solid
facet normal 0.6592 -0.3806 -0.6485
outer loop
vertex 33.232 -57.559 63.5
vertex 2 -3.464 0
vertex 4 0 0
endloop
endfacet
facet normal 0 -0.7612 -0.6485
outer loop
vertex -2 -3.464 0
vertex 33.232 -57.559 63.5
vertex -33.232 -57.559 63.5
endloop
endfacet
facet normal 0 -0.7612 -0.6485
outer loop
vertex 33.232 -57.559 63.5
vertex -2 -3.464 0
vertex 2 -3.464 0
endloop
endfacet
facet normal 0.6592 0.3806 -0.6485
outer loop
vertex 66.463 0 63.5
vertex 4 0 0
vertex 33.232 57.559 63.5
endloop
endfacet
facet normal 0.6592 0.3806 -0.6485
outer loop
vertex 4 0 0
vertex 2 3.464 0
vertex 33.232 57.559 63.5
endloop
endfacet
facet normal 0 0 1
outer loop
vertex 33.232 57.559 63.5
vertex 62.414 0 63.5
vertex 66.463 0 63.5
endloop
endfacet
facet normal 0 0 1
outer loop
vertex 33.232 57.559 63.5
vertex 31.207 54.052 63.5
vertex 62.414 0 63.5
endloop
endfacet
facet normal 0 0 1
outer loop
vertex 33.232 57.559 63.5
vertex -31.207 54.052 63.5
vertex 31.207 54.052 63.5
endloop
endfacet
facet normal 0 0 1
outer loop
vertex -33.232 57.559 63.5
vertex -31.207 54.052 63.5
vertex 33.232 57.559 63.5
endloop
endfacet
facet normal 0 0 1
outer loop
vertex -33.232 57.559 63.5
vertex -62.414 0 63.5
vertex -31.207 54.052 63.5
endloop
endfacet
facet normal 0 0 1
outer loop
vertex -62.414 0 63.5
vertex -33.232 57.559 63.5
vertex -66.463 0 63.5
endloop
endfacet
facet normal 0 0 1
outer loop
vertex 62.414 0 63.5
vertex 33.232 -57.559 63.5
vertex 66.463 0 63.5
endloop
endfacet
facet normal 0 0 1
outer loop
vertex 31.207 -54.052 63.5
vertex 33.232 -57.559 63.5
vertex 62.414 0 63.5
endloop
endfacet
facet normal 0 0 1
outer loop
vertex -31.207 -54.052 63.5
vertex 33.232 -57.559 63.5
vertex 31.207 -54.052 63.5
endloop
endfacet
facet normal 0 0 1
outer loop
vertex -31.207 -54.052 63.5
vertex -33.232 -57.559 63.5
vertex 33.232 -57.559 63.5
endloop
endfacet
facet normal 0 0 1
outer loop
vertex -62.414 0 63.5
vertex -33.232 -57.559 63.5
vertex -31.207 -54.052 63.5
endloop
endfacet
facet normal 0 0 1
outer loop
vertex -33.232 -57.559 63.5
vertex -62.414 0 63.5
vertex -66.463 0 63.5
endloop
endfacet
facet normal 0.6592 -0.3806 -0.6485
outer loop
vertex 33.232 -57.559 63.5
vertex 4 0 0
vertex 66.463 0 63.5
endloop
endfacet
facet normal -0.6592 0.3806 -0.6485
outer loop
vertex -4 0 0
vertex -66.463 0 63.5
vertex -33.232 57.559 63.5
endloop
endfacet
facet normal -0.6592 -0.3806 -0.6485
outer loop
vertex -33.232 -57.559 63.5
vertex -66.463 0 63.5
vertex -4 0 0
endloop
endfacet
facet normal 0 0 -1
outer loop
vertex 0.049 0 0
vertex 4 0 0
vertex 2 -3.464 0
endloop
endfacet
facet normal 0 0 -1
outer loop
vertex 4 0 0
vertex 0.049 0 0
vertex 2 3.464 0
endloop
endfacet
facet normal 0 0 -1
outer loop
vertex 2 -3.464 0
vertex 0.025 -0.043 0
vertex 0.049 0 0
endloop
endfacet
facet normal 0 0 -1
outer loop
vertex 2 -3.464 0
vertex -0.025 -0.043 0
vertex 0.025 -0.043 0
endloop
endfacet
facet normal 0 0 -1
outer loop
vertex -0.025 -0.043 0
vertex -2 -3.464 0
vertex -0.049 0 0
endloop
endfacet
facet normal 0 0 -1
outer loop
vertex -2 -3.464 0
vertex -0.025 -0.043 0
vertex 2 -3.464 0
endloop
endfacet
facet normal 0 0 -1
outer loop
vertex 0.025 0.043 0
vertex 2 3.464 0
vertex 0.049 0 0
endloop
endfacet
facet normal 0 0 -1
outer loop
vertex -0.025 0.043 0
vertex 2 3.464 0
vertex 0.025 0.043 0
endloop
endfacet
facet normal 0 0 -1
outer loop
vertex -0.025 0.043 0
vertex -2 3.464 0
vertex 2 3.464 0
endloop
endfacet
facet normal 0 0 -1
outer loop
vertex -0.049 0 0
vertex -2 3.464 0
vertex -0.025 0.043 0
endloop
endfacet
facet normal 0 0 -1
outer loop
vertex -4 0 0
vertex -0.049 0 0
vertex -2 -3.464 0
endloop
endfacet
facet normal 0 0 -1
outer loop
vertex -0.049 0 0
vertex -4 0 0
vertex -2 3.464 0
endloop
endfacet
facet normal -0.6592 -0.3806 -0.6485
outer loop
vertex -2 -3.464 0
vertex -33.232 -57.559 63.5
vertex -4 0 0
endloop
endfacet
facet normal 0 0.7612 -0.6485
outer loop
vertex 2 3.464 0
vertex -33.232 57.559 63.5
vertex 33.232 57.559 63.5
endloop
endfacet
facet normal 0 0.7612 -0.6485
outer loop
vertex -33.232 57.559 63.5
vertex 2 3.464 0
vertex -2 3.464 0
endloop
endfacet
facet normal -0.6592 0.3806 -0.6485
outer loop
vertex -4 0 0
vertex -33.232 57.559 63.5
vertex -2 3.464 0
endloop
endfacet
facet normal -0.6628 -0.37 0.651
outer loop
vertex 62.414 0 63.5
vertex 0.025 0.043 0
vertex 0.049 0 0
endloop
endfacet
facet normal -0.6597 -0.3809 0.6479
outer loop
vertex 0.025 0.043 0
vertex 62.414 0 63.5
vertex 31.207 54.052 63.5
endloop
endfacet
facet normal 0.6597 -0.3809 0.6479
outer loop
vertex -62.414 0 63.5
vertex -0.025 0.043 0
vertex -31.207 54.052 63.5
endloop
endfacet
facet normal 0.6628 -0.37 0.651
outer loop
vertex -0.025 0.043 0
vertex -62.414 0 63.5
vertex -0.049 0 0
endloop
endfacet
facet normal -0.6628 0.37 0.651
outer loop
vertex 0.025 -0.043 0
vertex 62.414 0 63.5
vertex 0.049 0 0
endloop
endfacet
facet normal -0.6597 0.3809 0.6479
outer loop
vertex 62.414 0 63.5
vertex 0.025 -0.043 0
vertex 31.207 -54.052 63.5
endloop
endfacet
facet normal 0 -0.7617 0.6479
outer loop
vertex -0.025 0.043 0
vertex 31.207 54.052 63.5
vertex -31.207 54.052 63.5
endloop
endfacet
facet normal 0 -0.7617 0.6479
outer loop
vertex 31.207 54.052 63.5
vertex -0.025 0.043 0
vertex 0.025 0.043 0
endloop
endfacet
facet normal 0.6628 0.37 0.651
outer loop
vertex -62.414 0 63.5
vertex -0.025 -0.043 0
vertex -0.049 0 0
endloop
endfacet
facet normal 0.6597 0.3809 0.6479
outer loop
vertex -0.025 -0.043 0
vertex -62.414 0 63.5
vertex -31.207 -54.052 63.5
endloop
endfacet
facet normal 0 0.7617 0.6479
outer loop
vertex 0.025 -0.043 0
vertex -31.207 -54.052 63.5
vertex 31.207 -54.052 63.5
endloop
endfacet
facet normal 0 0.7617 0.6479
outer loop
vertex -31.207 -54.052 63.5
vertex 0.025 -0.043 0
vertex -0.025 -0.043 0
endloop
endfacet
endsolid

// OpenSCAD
difference() {
    cylinder(r1=4,r2=66.4634,h=63.5,$fn=6);
    translate([0,0,-.05])cylinder(r1=0,r2=62.4634,h=63.6,$fn=6);
}
